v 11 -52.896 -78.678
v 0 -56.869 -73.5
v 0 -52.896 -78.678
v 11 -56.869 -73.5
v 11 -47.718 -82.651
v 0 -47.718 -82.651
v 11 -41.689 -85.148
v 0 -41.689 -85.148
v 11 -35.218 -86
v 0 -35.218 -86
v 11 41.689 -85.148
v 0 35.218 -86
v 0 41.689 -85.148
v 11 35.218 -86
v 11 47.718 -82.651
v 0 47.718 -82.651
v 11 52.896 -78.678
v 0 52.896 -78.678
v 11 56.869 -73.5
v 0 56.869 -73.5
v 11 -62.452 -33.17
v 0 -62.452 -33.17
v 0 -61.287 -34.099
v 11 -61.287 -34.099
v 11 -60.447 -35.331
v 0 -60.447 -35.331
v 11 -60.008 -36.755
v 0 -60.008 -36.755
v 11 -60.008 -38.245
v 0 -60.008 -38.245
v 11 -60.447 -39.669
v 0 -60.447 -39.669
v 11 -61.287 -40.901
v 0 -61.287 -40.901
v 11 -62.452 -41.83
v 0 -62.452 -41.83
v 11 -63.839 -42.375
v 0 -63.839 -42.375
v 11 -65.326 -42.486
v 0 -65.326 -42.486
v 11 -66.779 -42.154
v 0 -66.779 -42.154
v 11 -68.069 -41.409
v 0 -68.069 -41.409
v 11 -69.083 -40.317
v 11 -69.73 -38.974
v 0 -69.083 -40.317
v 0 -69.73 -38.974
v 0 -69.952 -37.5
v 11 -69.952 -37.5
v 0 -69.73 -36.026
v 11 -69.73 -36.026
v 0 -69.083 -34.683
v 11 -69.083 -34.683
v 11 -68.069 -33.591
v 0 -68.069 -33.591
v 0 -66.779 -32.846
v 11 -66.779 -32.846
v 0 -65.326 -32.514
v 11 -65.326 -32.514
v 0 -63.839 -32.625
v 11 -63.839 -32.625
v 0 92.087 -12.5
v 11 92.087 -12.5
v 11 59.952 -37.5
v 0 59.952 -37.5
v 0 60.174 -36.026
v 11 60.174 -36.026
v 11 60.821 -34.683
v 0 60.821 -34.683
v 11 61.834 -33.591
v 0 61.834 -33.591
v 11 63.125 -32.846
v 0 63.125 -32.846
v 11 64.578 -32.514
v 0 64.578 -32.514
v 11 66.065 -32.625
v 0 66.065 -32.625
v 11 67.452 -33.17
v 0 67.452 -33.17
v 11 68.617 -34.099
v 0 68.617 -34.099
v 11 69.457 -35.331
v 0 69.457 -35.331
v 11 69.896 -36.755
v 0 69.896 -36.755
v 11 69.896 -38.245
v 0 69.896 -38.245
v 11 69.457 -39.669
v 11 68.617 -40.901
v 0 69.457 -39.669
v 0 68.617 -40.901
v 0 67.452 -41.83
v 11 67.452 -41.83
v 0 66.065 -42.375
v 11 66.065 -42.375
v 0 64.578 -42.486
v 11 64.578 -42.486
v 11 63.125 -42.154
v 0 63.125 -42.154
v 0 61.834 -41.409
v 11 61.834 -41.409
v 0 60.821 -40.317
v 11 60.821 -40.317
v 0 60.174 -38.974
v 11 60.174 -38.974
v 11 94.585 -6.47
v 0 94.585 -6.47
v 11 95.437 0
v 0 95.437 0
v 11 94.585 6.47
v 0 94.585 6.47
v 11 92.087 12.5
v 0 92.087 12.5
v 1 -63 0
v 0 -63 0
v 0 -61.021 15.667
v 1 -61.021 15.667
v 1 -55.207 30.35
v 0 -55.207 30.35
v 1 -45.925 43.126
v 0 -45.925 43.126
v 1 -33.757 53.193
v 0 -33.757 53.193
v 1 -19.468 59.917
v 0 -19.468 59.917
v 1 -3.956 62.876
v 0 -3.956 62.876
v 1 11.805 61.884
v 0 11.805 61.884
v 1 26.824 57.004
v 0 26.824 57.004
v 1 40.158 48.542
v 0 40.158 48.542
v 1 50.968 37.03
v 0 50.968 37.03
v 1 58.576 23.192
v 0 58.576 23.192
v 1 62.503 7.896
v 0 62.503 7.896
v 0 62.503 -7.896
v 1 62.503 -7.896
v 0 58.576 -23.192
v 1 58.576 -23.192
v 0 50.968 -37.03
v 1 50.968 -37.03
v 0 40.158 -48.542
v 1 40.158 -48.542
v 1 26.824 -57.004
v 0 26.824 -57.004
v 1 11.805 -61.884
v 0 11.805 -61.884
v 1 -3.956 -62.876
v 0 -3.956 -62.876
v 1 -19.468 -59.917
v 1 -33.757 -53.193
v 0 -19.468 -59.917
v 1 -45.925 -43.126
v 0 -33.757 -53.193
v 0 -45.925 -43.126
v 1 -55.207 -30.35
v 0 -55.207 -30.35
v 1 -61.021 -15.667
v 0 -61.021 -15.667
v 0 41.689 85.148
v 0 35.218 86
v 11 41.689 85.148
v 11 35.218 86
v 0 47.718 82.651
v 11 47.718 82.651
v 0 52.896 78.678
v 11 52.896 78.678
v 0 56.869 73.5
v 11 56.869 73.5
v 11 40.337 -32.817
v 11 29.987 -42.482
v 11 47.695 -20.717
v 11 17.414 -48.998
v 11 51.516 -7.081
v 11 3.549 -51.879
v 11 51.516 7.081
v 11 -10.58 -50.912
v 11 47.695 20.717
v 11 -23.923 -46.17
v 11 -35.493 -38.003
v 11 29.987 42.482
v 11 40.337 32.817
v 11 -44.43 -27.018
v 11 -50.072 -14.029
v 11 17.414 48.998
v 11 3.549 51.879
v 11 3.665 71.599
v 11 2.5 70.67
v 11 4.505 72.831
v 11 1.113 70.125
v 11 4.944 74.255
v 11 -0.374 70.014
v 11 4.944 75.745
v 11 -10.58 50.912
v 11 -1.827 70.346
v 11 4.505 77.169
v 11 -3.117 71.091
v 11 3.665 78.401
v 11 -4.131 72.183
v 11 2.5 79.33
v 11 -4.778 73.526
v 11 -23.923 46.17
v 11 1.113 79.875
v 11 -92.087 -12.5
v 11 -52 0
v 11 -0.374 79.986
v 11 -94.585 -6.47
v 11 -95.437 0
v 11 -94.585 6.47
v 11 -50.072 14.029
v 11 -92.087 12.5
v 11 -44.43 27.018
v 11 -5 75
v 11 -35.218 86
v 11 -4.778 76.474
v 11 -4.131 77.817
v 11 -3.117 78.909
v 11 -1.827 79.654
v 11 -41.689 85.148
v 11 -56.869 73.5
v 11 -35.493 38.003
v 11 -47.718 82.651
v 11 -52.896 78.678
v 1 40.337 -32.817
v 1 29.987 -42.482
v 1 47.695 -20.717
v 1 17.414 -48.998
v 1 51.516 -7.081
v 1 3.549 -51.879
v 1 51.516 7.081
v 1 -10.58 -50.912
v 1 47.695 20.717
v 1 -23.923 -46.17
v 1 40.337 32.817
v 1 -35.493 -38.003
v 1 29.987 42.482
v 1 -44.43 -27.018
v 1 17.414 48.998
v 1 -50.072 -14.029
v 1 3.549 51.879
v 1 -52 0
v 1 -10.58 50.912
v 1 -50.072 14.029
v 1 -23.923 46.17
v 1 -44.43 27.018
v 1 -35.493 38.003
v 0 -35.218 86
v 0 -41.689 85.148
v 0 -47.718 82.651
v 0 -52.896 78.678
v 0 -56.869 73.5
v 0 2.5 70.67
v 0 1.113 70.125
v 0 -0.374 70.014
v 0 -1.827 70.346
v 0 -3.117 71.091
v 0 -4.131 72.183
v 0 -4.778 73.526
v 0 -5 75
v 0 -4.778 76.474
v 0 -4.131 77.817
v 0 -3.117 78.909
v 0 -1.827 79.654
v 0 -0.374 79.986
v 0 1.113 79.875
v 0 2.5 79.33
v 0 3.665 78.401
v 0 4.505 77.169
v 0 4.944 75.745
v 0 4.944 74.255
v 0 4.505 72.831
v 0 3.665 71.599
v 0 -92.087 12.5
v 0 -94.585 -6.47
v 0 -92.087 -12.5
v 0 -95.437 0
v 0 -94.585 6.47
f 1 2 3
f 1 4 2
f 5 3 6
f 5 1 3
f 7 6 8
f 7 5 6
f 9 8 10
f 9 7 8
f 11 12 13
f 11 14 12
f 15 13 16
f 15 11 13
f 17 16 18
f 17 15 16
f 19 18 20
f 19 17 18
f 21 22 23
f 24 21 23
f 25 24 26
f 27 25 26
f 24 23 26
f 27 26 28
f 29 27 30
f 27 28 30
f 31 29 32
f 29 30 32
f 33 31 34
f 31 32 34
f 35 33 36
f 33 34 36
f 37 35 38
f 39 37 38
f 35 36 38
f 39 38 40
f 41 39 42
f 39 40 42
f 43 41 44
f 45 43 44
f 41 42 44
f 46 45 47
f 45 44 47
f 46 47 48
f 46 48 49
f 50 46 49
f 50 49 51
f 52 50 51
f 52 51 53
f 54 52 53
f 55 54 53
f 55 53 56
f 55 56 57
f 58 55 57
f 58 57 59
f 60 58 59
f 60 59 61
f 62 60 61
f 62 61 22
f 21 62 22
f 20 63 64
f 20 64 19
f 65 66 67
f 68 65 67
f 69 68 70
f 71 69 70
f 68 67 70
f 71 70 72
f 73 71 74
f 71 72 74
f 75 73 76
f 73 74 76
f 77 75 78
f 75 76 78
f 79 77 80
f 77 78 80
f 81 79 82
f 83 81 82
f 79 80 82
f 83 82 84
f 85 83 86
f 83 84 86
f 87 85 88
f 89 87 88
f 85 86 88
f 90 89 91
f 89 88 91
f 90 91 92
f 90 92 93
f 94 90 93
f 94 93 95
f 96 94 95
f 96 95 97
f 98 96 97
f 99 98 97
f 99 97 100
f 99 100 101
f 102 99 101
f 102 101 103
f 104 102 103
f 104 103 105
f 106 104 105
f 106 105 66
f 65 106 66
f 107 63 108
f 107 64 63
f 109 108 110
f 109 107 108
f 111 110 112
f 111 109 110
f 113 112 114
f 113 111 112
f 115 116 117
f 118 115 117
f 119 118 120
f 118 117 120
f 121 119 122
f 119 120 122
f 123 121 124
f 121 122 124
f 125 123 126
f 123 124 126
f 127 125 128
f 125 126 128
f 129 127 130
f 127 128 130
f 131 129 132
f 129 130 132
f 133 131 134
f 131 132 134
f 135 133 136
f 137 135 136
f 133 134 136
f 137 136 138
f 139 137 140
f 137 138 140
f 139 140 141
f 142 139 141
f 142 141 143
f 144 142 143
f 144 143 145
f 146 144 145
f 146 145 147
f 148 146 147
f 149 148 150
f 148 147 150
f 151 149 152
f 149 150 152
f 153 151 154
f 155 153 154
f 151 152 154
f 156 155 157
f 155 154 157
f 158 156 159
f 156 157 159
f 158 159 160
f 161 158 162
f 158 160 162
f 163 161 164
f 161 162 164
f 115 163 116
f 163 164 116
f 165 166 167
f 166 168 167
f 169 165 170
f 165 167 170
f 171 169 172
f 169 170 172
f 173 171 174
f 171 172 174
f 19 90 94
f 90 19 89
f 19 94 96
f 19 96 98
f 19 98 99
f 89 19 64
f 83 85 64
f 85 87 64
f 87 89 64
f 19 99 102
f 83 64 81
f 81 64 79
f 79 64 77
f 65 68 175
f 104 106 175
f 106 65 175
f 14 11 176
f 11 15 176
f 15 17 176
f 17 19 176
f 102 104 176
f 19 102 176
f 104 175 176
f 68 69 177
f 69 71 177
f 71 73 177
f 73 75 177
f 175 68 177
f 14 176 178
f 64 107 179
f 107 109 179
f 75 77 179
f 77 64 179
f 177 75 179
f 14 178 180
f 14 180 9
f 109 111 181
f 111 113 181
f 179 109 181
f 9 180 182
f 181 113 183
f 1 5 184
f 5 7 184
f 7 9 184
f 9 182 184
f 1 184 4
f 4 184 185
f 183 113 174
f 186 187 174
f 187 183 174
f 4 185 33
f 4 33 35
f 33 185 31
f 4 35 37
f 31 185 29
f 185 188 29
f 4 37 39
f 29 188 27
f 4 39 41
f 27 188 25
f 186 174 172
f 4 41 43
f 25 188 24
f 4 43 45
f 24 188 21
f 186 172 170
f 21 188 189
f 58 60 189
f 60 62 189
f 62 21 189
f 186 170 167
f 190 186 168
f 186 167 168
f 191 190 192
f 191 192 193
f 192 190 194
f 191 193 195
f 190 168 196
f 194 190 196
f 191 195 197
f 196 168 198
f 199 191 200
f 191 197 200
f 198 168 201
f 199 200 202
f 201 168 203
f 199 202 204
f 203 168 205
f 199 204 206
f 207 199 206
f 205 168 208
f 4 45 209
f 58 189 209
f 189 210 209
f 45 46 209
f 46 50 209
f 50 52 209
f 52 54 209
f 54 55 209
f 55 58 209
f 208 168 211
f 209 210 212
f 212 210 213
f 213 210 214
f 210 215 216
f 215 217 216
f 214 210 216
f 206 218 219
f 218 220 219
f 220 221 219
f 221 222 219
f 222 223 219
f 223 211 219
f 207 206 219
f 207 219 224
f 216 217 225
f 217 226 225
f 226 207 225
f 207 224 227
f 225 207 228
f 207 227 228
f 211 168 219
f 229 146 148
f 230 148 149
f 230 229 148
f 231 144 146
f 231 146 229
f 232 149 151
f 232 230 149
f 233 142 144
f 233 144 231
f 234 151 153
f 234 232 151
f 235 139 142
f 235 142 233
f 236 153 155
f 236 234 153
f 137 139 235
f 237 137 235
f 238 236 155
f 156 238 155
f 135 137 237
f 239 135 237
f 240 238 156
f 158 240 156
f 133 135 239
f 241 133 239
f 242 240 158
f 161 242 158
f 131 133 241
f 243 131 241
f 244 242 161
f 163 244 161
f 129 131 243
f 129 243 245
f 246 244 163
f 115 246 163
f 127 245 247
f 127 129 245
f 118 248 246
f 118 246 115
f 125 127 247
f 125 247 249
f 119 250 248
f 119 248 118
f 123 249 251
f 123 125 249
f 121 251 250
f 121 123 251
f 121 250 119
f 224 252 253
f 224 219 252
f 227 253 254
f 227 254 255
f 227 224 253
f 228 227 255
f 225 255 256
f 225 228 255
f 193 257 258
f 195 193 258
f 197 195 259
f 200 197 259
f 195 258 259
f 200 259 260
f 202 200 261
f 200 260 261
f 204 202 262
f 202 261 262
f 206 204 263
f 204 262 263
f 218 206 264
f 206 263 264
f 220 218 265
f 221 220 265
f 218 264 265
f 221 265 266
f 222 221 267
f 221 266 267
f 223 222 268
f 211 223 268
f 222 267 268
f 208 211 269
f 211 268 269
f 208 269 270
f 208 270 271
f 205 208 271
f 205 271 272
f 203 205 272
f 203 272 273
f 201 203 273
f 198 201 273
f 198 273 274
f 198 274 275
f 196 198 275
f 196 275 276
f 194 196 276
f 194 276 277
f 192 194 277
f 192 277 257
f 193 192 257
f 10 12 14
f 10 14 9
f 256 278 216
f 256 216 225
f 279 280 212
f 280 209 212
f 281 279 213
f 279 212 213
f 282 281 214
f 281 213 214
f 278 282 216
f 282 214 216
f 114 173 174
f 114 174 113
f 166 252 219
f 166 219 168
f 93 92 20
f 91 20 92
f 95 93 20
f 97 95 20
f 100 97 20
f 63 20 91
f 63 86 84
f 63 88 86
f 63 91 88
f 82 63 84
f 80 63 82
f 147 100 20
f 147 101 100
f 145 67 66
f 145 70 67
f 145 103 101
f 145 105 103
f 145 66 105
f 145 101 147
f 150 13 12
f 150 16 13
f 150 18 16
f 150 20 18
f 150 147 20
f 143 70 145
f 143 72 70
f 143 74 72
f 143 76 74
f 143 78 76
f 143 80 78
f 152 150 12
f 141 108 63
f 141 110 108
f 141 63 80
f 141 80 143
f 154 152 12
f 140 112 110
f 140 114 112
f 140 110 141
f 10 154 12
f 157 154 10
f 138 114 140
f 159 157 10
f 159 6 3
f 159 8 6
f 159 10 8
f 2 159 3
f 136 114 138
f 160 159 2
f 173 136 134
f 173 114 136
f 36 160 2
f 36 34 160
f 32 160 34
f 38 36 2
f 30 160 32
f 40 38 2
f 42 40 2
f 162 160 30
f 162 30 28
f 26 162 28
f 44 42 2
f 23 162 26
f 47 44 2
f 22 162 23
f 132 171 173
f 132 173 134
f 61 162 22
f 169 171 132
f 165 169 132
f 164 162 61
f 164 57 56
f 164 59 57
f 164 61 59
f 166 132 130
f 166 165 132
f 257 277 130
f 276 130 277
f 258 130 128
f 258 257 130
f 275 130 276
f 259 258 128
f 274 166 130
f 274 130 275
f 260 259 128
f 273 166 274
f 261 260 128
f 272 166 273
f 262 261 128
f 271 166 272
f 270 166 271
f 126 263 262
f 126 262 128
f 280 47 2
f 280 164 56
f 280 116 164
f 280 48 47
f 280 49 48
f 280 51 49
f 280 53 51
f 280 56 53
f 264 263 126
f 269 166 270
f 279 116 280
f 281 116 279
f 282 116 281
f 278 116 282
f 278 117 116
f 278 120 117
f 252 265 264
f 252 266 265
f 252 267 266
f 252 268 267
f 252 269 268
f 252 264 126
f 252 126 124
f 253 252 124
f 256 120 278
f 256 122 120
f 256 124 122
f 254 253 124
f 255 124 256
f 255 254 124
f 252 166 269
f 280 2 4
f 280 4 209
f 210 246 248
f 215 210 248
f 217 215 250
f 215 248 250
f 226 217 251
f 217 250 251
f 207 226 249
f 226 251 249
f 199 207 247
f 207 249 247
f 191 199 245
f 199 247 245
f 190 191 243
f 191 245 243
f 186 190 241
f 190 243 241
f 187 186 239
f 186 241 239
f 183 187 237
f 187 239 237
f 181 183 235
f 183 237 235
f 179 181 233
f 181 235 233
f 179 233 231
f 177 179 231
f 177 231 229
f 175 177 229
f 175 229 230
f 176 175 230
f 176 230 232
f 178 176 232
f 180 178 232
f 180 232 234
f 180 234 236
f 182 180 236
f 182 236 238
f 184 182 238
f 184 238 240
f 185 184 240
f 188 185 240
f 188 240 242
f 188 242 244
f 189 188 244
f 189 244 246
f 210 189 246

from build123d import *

# Parameters (mm, degrees)
F2_R             = 35.25
F3_DEPTH         = 11
F4_R             = 25
F7_R             = 17.5
F8_DEPTH         = 14.001
F9_R             = 5
F10_DEPTH        = 67.001
F10_COPIES_COUNT = 3
F11_R            = 52
F11_R_2          = 17.5
F12_DEPTH        = 67.001
F13_W            = 268.7109410763
F13_H            = 256.3393563032
F13_R            = 5
F13_R_2          = 52
F14_DEPTH        = 40
F15_R            = 63
F15_R_2          = 52
F16_DEPTH        = 1


# Not quite as in the source:
# - a feature of the source that left no trace in its solid (it failed there, or was rolled back) is left out
# - a pattern or mirror of a feature is missing from the dataset's text; its kind, count and spacing are read off the source's solid


with BuildPart() as f1:
    # F0 (on Front) → F1 (revolve)
    with BuildSketch(Plane.XZ):
        Polygon((67, 28.15), (67, 35.25), (0, 35.25), (0, 0), (14, 0), (14, 28.15), align=None)
    revolve(axis=Axis((7, 0, 0), (-1, 0, 0)))

    # F2 (on face) → F3 (join)
    with BuildSketch(Plane(origin=(0, 0, 0), x_dir=(0, -1, 0), z_dir=(-1, 0, 0))):
        Polygon((49.6521231503, 86), (-49.6521231503, 86), (-99.3042463006, 0), (-49.6521231503, -86), (49.6521231503, -86), (99.3042463006, 0), align=None)
        Circle(F2_R, mode=Mode.SUBTRACT)
    extrude(amount=-F3_DEPTH)

    # F4
    f4_edges = [f1.edges().sort_by_distance(p)[0] for p in [
        (5.5, 49.652123, -86),
        (5.5, -49.652123, -86),
        (5.5, -99.304246, 0),
        (5.5, -49.652123, 86),
        (5.5, 99.304246, 0),
        (5.5, 49.652123, 86),
    ]]
    fillet(f4_edges, radius=F4_R)

    # F7 (on face) → F8 (cut, through all)
    with BuildSketch(Plane.YZ.offset(14)):
        Circle(F7_R)
    extrude(amount=-F8_DEPTH, mode=Mode.SUBTRACT)

    # F9 (on face) → F10 (cut, through all)
    with BuildSketch(Plane(origin=(0, 0, 0), x_dir=(0, -1, 0), z_dir=(-1, 0, 0))):
        with Locations((-64.9519052838, -37.5)):
            Circle(F9_R)
    f10 = extrude(amount=-F10_DEPTH, mode=Mode.SUBTRACT)

    # F10_copies: F10 ×3 about axis
    f10_copies_axis = Axis((0, 0, 0), (1, 0, 0))
    for i in range(1, F10_COPIES_COUNT):
        add(f10.rotate(f10_copies_axis, i * 360 / F10_COPIES_COUNT), mode=Mode.SUBTRACT)

    # F11 (on face) → F12 (cut, through all)
    with BuildSketch(Plane(origin=(0, 0, 0), x_dir=(0, -1, 0), z_dir=(-1, 0, 0))):
        Circle(F11_R)
        Circle(F11_R_2, mode=Mode.SUBTRACT)
    extrude(amount=-F12_DEPTH, mode=Mode.SUBTRACT)

    # F13 (on face) → F14 (cut)
    with BuildSketch(Plane.YZ.offset(11)):
        with Locations((8.389338851, -8.3738937974)):
            Rectangle(F13_W, F13_H)
        with BuildLine():
            Line((-35.2183664206, 86), (35.2183664206, 86))
            ThreePointArc((35.2183664206, 86), (47.7183664206, 82.6506350946), (56.8690015152, 73.5))
            Line((56.8690015152, 73.5), (92.0873679357, 12.5))
            ThreePointArc((92.0873679357, 12.5), (95.4367328411, 0), (92.0873679357, -12.5))
            Line((92.0873679357, -12.5), (56.8690015152, -73.5))
            ThreePointArc((56.8690015152, -73.5), (47.7183664206, -82.6506350946), (35.2183664206, -86))
            Line((35.2183664206, -86), (-35.2183664206, -86))
            ThreePointArc((-35.2183664206, -86), (-47.7183664206, -82.6506350946), (-56.8690015152, -73.5))
            Line((-56.8690015152, -73.5), (-92.0873679357, -12.5))
            ThreePointArc((-92.0873679357, -12.5), (-95.4367328411, 0), (-92.0873679357, 12.5))
            Line((-92.0873679357, 12.5), (-56.8690015152, 73.5))
            ThreePointArc((-56.8690015152, 73.5), (-47.7183664206, 82.6506350946), (-35.2183664206, 86))
        make_face(mode=Mode.SUBTRACT)
        with BuildLine():
            ThreePointArc((56.8690015152, 73.5), (47.7183664206, 82.6506350946), (35.2183664206, 86))
            Line((35.2183664206, 86), (-35.2183664206, 86))
            ThreePointArc((-35.2183664206, 86), (-47.7183664206, 82.6506350946), (-56.8690015152, 73.5))
            Line((-56.8690015152, 73.5), (-92.0873679357, 12.5))
            ThreePointArc((-92.0873679357, 12.5), (-95.4367328411, 0), (-92.0873679357, -12.5))
            Line((-92.0873679357, -12.5), (-56.8690015152, -73.5))
            ThreePointArc((-56.8690015152, -73.5), (-47.7183664206, -82.6506350946), (-35.2183664206, -86))
            Line((-35.2183664206, -86), (35.2183664206, -86))
            ThreePointArc((35.2183664206, -86), (47.7183664206, -82.6506350946), (56.8690015152, -73.5))
            Line((56.8690015152, -73.5), (92.0873679357, -12.5))
            ThreePointArc((92.0873679357, -12.5), (95.4367328411, 0), (92.0873679357, 12.5))
            Line((92.0873679357, 12.5), (56.8690015152, 73.5))
        make_face()
        with Locations((-64.9519052838, -37.5)):
            Circle(F13_R, mode=Mode.SUBTRACT)
        with Locations((64.9519052838, -37.5)):
            Circle(F13_R, mode=Mode.SUBTRACT)
        Circle(F13_R_2, mode=Mode.SUBTRACT)
        with Locations((0, 75)):
            Circle(F13_R, mode=Mode.SUBTRACT)
    extrude(amount=F14_DEPTH, mode=Mode.SUBTRACT)

    # F15 (on face) → F16 (cut)
    with BuildSketch(Plane(origin=(0, 0, 0), x_dir=(0, -1, 0), z_dir=(-1, 0, 0))):
        Circle(F15_R)
        Circle(F15_R_2, mode=Mode.SUBTRACT)
    extrude(amount=-F16_DEPTH, mode=Mode.SUBTRACT)


solid = f1.part
